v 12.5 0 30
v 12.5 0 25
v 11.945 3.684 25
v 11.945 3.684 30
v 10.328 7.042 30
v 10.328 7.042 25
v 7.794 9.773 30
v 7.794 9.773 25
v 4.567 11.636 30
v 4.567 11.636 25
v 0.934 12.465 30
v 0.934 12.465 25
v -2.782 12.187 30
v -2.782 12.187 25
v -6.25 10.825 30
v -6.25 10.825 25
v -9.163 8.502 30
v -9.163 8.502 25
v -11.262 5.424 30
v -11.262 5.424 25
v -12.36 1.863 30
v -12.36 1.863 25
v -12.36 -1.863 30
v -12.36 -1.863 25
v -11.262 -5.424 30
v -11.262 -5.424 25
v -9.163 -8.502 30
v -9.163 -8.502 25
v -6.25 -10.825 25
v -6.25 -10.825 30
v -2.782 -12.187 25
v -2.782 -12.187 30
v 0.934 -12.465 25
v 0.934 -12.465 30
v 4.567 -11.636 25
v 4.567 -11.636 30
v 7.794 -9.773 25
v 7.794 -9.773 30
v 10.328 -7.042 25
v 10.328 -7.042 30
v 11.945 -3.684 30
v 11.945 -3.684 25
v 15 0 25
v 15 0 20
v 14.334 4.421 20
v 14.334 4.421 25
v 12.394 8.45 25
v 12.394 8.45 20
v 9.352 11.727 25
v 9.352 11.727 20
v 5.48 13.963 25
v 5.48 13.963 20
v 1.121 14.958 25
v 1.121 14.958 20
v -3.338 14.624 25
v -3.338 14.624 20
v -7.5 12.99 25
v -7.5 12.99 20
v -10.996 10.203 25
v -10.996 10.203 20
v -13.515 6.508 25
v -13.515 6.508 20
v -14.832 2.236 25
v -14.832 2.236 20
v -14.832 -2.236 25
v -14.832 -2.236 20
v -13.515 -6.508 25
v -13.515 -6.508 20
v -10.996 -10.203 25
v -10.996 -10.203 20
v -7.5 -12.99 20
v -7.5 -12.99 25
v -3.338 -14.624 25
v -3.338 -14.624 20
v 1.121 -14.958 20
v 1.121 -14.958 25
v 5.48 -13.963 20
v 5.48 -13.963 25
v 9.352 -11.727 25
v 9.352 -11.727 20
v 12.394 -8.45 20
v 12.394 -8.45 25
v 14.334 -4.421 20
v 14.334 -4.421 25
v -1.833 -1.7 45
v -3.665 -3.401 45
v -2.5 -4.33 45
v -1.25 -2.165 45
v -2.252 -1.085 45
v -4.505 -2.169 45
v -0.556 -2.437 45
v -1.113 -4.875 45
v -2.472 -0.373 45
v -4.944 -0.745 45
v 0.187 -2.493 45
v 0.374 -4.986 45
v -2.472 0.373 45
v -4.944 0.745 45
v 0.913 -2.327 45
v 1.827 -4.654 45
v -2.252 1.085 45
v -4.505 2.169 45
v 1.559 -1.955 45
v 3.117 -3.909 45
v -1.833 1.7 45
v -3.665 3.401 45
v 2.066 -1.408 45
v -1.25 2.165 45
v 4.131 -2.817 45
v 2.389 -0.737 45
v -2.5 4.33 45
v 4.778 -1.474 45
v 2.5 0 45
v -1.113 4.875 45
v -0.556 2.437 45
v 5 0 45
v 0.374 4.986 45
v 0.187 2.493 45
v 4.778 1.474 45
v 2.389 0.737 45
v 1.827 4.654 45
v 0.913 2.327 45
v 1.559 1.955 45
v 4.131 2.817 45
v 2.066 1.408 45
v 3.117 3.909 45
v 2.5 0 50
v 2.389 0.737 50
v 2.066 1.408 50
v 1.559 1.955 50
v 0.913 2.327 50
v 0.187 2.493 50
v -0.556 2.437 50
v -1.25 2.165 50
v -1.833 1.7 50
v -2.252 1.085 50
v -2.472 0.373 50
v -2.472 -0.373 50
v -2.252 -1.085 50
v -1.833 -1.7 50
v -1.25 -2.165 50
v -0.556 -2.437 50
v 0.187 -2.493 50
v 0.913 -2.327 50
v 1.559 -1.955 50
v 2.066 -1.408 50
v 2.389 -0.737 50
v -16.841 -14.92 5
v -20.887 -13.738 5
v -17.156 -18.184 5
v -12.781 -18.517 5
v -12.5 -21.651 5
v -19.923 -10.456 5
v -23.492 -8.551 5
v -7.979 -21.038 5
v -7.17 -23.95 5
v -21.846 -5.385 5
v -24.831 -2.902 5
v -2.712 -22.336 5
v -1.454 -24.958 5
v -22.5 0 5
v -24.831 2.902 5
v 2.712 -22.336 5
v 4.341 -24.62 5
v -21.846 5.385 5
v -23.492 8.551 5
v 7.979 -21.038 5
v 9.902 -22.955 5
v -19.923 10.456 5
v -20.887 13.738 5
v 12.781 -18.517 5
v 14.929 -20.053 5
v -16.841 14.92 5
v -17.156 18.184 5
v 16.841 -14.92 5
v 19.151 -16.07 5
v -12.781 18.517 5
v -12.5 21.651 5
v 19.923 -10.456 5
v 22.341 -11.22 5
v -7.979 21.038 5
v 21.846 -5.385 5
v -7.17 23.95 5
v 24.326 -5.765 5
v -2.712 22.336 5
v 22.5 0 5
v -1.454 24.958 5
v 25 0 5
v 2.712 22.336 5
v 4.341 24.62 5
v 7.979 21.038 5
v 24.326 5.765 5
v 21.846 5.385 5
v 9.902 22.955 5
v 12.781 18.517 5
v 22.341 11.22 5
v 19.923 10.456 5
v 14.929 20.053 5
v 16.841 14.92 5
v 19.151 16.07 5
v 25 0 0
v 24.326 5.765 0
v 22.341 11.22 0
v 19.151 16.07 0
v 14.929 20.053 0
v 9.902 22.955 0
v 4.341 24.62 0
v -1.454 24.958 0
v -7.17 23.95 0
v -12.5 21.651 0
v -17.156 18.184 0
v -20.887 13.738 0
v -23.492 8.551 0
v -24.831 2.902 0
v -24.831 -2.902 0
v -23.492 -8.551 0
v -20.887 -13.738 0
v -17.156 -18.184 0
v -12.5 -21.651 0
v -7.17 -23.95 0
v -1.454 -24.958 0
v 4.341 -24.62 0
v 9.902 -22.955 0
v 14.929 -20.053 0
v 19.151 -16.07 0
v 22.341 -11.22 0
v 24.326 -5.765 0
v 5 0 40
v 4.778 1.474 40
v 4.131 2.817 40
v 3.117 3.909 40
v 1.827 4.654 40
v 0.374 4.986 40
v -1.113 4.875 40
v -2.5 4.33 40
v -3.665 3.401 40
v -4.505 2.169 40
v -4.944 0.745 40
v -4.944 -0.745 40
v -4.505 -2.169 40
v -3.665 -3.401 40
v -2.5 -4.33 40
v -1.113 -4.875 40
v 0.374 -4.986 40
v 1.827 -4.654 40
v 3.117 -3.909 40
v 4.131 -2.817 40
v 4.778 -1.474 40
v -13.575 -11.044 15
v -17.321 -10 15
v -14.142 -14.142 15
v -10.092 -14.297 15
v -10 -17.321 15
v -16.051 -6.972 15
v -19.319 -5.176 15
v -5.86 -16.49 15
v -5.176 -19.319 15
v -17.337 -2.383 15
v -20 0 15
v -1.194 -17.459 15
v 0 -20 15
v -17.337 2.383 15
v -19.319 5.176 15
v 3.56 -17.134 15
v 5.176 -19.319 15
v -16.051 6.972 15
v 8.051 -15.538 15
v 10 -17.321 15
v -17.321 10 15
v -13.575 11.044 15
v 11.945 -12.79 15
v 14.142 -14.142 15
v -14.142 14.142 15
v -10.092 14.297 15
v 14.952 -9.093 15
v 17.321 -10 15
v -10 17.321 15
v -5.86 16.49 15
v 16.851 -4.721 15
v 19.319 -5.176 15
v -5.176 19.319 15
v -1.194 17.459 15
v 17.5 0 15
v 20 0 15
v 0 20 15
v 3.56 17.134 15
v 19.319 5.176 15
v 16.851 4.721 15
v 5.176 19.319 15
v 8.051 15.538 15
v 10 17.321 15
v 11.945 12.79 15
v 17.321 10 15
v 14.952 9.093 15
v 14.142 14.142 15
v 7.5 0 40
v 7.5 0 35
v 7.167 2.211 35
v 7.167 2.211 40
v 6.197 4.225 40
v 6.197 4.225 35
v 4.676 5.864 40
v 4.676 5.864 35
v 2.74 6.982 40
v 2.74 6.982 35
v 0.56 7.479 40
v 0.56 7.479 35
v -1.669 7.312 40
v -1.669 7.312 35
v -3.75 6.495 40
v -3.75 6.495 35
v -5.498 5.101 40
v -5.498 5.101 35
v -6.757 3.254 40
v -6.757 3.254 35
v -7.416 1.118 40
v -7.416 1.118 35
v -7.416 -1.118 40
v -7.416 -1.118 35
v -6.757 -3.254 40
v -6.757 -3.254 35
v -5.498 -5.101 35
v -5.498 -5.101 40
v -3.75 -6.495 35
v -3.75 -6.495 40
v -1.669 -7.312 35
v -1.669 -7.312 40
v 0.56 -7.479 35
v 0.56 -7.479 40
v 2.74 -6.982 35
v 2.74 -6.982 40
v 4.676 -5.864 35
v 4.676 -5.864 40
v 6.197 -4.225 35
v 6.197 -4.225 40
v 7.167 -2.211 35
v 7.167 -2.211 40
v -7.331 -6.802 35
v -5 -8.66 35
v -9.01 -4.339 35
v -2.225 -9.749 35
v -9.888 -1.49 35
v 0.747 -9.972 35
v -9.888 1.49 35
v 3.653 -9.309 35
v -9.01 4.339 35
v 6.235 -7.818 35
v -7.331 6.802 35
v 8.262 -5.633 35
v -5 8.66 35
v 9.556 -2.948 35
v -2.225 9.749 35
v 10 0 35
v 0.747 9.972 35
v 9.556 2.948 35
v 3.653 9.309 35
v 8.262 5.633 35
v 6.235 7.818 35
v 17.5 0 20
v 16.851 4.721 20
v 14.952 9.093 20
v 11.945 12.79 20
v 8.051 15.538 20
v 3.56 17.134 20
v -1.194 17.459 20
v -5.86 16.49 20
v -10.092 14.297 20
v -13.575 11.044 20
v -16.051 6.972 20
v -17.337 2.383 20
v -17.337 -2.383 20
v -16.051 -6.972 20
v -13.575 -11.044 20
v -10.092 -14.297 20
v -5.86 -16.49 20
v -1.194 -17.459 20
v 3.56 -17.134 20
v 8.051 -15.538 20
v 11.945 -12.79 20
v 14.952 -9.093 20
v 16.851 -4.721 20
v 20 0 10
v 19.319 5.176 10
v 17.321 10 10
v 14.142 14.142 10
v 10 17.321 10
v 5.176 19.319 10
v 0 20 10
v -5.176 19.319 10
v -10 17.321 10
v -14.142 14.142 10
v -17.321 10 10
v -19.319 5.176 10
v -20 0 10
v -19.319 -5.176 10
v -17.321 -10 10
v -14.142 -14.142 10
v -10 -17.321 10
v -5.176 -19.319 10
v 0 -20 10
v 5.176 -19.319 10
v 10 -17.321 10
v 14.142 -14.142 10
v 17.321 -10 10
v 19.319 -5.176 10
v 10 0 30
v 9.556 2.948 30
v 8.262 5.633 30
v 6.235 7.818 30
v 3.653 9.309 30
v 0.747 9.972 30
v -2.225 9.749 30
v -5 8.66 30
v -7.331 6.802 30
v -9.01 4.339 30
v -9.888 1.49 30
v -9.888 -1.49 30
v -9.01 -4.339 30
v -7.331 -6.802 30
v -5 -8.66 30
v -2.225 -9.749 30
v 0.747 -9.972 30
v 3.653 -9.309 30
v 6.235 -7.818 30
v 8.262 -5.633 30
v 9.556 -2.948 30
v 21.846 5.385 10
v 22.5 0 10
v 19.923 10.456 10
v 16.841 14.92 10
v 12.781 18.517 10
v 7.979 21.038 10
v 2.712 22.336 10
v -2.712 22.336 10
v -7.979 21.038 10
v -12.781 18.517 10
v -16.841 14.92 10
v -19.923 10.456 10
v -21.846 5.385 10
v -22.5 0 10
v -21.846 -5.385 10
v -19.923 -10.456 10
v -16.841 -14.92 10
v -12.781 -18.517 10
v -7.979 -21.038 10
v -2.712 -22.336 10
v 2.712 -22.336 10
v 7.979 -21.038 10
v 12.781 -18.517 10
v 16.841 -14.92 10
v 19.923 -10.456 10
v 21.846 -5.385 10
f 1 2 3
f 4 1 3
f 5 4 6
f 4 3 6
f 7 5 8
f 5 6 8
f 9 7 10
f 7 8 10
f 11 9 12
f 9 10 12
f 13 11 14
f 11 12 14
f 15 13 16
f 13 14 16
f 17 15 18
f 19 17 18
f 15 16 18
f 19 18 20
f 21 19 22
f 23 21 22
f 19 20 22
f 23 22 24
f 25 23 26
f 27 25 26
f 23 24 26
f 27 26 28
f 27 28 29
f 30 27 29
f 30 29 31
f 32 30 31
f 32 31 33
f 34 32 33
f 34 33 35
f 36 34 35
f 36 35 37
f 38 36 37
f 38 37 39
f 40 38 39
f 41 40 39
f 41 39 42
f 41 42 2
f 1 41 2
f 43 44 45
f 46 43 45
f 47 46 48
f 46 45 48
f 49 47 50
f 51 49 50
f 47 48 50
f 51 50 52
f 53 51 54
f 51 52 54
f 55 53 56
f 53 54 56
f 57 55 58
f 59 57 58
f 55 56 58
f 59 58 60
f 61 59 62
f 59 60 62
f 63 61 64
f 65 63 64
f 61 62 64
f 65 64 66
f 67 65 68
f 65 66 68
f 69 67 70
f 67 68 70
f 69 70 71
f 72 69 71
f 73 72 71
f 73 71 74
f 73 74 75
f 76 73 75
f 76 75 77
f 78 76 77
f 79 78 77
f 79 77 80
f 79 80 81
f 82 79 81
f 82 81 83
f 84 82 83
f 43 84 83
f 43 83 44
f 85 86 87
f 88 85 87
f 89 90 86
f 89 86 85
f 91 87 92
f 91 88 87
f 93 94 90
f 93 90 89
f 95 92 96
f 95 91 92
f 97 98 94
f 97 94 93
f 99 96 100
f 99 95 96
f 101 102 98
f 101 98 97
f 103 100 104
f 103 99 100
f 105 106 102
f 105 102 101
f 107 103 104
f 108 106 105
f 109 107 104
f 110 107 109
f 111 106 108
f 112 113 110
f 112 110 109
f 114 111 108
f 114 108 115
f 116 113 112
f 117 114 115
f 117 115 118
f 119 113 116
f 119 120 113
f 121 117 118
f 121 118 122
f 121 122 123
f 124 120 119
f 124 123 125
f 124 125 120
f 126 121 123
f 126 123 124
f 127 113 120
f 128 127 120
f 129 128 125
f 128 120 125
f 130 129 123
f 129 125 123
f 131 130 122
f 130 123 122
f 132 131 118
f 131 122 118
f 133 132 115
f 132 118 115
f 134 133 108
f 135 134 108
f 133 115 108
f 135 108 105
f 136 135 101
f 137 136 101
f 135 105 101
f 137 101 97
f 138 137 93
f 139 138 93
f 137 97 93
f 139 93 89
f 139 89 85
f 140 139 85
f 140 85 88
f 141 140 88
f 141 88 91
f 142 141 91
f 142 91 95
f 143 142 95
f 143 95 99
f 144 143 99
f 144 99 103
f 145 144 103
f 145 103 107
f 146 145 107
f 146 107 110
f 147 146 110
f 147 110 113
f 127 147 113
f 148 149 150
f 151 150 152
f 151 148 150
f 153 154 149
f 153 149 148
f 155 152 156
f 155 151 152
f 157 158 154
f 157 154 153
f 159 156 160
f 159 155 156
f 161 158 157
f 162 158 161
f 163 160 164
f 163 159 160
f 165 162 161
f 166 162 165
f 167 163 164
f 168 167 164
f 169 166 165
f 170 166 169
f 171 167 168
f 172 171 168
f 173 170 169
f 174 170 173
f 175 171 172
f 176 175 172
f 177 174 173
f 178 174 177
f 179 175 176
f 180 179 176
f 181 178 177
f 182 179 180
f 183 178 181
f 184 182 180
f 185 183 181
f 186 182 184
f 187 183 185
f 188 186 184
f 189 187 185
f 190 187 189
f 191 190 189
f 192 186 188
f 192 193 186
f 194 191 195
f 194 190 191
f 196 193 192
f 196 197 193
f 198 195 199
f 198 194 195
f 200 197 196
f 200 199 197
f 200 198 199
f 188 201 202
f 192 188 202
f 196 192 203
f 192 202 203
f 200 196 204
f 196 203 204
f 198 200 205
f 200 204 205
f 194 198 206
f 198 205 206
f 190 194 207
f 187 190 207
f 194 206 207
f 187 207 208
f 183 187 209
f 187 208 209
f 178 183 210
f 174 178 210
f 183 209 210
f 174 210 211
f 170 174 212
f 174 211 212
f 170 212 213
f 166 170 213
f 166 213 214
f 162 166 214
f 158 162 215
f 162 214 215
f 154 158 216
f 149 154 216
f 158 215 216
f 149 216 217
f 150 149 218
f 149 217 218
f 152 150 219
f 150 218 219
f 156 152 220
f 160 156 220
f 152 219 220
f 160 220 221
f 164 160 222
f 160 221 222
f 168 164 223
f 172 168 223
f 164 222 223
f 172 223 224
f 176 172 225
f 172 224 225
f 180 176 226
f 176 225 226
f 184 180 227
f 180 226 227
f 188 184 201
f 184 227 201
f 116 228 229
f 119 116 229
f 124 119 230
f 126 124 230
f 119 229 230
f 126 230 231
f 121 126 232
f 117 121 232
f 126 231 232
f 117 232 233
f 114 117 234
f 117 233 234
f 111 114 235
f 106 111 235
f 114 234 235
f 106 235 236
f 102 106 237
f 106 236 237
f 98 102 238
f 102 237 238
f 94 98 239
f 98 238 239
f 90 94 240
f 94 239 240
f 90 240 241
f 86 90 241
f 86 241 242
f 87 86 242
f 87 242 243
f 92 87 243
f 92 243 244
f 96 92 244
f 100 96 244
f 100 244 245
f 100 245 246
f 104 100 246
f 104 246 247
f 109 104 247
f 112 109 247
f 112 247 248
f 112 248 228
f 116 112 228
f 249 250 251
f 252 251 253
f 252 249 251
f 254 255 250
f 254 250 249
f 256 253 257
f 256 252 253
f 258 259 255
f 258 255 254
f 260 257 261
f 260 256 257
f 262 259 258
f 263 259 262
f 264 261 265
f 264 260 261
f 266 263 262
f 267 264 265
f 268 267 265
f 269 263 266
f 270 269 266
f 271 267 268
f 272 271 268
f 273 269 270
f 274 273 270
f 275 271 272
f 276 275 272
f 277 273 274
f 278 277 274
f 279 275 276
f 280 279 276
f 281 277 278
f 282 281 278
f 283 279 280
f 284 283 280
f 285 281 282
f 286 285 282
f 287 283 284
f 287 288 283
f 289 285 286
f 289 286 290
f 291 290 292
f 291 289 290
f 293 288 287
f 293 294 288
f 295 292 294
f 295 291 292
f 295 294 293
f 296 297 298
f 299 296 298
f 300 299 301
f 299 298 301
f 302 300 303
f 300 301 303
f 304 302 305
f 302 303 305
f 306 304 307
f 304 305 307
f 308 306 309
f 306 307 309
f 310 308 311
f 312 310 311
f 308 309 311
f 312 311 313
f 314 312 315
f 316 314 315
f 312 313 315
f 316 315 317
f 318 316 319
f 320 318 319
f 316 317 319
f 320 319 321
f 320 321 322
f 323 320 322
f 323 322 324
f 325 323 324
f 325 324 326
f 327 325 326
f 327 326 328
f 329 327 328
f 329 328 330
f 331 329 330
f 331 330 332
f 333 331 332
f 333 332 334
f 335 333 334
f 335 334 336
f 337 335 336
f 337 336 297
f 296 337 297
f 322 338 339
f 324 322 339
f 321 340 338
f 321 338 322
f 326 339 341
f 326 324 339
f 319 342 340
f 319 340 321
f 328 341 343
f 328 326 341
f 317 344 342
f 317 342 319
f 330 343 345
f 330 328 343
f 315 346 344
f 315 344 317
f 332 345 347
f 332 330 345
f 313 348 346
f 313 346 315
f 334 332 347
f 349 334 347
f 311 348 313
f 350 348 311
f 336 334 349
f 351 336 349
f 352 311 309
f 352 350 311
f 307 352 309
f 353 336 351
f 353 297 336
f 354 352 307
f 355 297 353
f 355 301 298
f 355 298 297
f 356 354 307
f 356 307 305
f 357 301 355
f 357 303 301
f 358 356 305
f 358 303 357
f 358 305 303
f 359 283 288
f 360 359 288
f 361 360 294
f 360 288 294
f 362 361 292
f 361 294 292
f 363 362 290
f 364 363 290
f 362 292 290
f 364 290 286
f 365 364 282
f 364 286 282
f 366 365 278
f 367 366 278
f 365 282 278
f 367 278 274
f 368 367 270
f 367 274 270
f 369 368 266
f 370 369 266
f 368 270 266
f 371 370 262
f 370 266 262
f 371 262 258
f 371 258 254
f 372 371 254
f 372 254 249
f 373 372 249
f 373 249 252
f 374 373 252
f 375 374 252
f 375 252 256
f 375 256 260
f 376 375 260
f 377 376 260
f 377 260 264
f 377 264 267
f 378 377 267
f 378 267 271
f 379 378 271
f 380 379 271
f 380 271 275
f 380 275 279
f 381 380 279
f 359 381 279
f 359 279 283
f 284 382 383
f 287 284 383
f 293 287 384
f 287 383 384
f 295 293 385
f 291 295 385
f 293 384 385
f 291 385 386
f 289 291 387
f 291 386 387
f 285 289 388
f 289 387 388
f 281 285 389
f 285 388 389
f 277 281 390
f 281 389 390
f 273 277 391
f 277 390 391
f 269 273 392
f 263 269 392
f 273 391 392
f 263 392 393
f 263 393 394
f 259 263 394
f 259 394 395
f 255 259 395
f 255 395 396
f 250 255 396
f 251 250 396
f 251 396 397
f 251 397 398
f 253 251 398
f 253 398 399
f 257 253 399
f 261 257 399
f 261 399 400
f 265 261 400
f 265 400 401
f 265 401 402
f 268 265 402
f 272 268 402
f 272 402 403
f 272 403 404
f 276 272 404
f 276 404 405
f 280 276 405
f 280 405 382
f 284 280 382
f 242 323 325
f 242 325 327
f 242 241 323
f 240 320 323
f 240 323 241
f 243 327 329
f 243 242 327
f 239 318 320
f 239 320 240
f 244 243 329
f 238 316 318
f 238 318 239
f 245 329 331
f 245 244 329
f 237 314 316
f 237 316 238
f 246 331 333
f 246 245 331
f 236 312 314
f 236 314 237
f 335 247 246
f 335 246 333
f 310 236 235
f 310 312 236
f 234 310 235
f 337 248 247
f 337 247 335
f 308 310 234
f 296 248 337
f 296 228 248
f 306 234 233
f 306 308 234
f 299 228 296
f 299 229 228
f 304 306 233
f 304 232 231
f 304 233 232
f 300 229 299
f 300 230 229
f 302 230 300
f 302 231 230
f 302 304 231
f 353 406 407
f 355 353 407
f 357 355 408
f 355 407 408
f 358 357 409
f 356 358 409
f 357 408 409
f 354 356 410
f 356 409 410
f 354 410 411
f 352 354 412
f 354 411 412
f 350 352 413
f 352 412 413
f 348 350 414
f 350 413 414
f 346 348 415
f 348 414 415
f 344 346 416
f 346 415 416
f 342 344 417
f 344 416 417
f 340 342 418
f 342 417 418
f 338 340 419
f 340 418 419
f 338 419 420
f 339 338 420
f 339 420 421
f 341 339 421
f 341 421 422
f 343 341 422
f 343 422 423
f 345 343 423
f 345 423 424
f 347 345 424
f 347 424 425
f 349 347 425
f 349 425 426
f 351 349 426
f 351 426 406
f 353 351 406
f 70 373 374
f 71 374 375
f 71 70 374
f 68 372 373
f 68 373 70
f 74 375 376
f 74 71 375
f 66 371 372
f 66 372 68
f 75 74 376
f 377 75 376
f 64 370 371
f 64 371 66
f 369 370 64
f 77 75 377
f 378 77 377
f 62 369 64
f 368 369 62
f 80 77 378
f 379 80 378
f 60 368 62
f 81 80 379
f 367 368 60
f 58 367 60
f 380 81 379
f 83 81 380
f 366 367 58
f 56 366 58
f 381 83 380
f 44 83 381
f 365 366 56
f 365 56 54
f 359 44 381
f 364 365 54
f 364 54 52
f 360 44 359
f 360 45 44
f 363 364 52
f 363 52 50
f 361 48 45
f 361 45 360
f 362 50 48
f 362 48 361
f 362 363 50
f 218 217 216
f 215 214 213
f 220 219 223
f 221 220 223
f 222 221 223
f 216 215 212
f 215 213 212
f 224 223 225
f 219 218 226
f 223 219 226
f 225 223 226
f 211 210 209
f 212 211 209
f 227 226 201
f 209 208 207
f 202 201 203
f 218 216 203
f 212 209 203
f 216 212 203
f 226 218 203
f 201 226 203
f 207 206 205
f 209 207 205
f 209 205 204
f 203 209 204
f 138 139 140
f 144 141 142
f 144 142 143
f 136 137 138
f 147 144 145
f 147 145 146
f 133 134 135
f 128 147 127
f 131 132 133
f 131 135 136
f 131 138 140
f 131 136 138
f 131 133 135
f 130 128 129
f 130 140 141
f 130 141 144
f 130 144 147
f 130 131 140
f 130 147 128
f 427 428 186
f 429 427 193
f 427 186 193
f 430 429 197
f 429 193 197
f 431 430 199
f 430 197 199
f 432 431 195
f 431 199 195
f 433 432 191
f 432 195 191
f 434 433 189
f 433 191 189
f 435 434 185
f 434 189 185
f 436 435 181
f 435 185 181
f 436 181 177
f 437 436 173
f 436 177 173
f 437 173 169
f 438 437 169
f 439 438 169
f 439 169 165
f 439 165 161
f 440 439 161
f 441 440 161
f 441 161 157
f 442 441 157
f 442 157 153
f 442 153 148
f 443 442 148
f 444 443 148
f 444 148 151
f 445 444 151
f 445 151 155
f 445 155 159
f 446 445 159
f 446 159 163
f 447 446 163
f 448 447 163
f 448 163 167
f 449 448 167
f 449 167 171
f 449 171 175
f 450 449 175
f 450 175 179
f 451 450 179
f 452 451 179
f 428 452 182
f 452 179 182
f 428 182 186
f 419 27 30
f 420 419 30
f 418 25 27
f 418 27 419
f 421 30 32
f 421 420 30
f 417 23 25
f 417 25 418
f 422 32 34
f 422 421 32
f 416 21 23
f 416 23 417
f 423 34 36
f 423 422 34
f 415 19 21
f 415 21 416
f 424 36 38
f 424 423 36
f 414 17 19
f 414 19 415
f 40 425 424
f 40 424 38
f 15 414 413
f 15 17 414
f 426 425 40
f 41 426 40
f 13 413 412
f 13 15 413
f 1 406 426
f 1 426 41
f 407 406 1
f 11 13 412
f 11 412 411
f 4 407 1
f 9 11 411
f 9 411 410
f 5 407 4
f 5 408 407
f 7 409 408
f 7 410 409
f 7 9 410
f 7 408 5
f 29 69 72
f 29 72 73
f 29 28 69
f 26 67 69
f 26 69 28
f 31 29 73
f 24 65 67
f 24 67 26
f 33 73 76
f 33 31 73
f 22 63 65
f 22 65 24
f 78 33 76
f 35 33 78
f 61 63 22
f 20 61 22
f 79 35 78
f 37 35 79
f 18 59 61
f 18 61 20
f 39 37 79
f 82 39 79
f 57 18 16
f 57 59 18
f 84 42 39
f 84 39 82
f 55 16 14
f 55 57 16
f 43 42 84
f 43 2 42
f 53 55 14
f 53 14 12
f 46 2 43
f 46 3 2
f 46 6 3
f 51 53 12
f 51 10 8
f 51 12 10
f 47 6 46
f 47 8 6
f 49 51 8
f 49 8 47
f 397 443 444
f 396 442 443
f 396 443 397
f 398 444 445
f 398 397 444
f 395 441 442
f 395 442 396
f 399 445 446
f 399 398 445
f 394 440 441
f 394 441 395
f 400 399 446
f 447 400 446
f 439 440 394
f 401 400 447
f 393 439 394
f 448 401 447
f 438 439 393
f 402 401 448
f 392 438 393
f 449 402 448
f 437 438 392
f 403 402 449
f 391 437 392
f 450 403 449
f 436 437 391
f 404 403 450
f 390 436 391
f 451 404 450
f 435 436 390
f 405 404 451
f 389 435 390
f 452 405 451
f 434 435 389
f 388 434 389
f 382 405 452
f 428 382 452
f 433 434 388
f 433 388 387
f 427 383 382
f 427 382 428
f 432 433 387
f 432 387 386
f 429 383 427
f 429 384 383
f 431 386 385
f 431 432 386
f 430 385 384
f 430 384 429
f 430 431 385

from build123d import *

# Parameters (mm, degrees)
F0_R      = 17.5
F0_R_2    = 15
F0_R_3    = 12.5
F0_R_4    = 10
F0_R_5    = 7.5
F0_R_6    = 5
F0_R_7    = 20
F0_R_8    = 25
F0_R_9    = 22.5
F0_R_10   = 2.5
F1_DEPTH  = 5
F2_DEPTH  = 10
F3_DEPTH  = 15
F4_DEPTH  = 20
F5_DEPTH  = 25
F6_DEPTH  = 30
F7_DEPTH  = 35
F8_DEPTH  = 40
F9_DEPTH  = 45
F10_DEPTH = 50


with BuildPart() as f1:
    # F0 (on Top) → F1 (new body)
    with BuildSketch(Plane.XY):
        Circle(F0_R)
        Circle(F0_R_2, mode=Mode.SUBTRACT)
        Circle(F0_R_3)
        Circle(F0_R_4, mode=Mode.SUBTRACT)
        Circle(F0_R_5)
        Circle(F0_R_6, mode=Mode.SUBTRACT)
        Circle(F0_R_4)
        Circle(F0_R_5, mode=Mode.SUBTRACT)
        Circle(F0_R_7)
        Circle(F0_R, mode=Mode.SUBTRACT)
        Circle(F0_R_2)
        Circle(F0_R_3, mode=Mode.SUBTRACT)
        Circle(F0_R_8)
        Circle(F0_R_9, mode=Mode.SUBTRACT)
        Circle(F0_R_10)
        Circle(F0_R_9)
        Circle(F0_R_7, mode=Mode.SUBTRACT)
        Circle(F0_R_6)
        Circle(F0_R_10, mode=Mode.SUBTRACT)
    extrude(amount=F1_DEPTH)

    # F0 (on Top) → F2 (join)
    with BuildSketch(Plane.XY):
        Circle(F0_R)
        Circle(F0_R_2, mode=Mode.SUBTRACT)
        Circle(F0_R_3)
        Circle(F0_R_4, mode=Mode.SUBTRACT)
        Circle(F0_R_5)
        Circle(F0_R_6, mode=Mode.SUBTRACT)
        Circle(F0_R_4)
        Circle(F0_R_5, mode=Mode.SUBTRACT)
        Circle(F0_R_7)
        Circle(F0_R, mode=Mode.SUBTRACT)
        Circle(F0_R_2)
        Circle(F0_R_3, mode=Mode.SUBTRACT)
        Circle(F0_R_10)
        Circle(F0_R_9)
        Circle(F0_R_7, mode=Mode.SUBTRACT)
        Circle(F0_R_6)
        Circle(F0_R_10, mode=Mode.SUBTRACT)
    extrude(amount=F2_DEPTH)

    # F0 (on Top) → F3 (join)
    with BuildSketch(Plane.XY):
        Circle(F0_R)
        Circle(F0_R_2, mode=Mode.SUBTRACT)
        Circle(F0_R_3)
        Circle(F0_R_4, mode=Mode.SUBTRACT)
        Circle(F0_R_5)
        Circle(F0_R_6, mode=Mode.SUBTRACT)
        Circle(F0_R_4)
        Circle(F0_R_5, mode=Mode.SUBTRACT)
        Circle(F0_R_7)
        Circle(F0_R, mode=Mode.SUBTRACT)
        Circle(F0_R_2)
        Circle(F0_R_3, mode=Mode.SUBTRACT)
        Circle(F0_R_10)
        Circle(F0_R_6)
        Circle(F0_R_10, mode=Mode.SUBTRACT)
    extrude(amount=F3_DEPTH)

    # F0 (on Top) → F4 (join)
    with BuildSketch(Plane.XY):
        Circle(F0_R_10)
        Circle(F0_R_6)
        Circle(F0_R_10, mode=Mode.SUBTRACT)
        Circle(F0_R_5)
        Circle(F0_R_6, mode=Mode.SUBTRACT)
        Circle(F0_R_4)
        Circle(F0_R_5, mode=Mode.SUBTRACT)
        Circle(F0_R_3)
        Circle(F0_R_4, mode=Mode.SUBTRACT)
        Circle(F0_R_2)
        Circle(F0_R_3, mode=Mode.SUBTRACT)
        Circle(F0_R)
        Circle(F0_R_2, mode=Mode.SUBTRACT)
    extrude(amount=F4_DEPTH)

    # F0 (on Top) → F5 (join)
    with BuildSketch(Plane.XY):
        Circle(F0_R_10)
        Circle(F0_R_6)
        Circle(F0_R_10, mode=Mode.SUBTRACT)
        Circle(F0_R_5)
        Circle(F0_R_6, mode=Mode.SUBTRACT)
        Circle(F0_R_4)
        Circle(F0_R_5, mode=Mode.SUBTRACT)
        Circle(F0_R_3)
        Circle(F0_R_4, mode=Mode.SUBTRACT)
        Circle(F0_R_2)
        Circle(F0_R_3, mode=Mode.SUBTRACT)
    extrude(amount=F5_DEPTH)

    # F0 (on Top) → F6 (join)
    with BuildSketch(Plane.XY):
        Circle(F0_R_10)
        Circle(F0_R_6)
        Circle(F0_R_10, mode=Mode.SUBTRACT)
        Circle(F0_R_5)
        Circle(F0_R_6, mode=Mode.SUBTRACT)
        Circle(F0_R_4)
        Circle(F0_R_5, mode=Mode.SUBTRACT)
        Circle(F0_R_3)
        Circle(F0_R_4, mode=Mode.SUBTRACT)
    extrude(amount=F6_DEPTH)

    # F0 (on Top) → F7 (join)
    with BuildSketch(Plane.XY):
        Circle(F0_R_4)
        Circle(F0_R_5, mode=Mode.SUBTRACT)
        Circle(F0_R_5)
        Circle(F0_R_6, mode=Mode.SUBTRACT)
        Circle(F0_R_6)
        Circle(F0_R_10, mode=Mode.SUBTRACT)
        Circle(F0_R_10)
    extrude(amount=F7_DEPTH)

    # F0 (on Top) → F8 (join)
    with BuildSketch(Plane.XY):
        Circle(F0_R_10)
        Circle(F0_R_6)
        Circle(F0_R_10, mode=Mode.SUBTRACT)
        Circle(F0_R_5)
        Circle(F0_R_6, mode=Mode.SUBTRACT)
    extrude(amount=F8_DEPTH)

    # F0 (on Top) → F9 (join)
    with BuildSketch(Plane.XY):
        Circle(F0_R_6)
        Circle(F0_R_10, mode=Mode.SUBTRACT)
        Circle(F0_R_10)
    extrude(amount=F9_DEPTH)

    # F0 (on Top) → F10 (join)
    with BuildSketch(Plane.XY):
        Circle(F0_R_10)
    extrude(amount=F10_DEPTH)


solid = f1.part
